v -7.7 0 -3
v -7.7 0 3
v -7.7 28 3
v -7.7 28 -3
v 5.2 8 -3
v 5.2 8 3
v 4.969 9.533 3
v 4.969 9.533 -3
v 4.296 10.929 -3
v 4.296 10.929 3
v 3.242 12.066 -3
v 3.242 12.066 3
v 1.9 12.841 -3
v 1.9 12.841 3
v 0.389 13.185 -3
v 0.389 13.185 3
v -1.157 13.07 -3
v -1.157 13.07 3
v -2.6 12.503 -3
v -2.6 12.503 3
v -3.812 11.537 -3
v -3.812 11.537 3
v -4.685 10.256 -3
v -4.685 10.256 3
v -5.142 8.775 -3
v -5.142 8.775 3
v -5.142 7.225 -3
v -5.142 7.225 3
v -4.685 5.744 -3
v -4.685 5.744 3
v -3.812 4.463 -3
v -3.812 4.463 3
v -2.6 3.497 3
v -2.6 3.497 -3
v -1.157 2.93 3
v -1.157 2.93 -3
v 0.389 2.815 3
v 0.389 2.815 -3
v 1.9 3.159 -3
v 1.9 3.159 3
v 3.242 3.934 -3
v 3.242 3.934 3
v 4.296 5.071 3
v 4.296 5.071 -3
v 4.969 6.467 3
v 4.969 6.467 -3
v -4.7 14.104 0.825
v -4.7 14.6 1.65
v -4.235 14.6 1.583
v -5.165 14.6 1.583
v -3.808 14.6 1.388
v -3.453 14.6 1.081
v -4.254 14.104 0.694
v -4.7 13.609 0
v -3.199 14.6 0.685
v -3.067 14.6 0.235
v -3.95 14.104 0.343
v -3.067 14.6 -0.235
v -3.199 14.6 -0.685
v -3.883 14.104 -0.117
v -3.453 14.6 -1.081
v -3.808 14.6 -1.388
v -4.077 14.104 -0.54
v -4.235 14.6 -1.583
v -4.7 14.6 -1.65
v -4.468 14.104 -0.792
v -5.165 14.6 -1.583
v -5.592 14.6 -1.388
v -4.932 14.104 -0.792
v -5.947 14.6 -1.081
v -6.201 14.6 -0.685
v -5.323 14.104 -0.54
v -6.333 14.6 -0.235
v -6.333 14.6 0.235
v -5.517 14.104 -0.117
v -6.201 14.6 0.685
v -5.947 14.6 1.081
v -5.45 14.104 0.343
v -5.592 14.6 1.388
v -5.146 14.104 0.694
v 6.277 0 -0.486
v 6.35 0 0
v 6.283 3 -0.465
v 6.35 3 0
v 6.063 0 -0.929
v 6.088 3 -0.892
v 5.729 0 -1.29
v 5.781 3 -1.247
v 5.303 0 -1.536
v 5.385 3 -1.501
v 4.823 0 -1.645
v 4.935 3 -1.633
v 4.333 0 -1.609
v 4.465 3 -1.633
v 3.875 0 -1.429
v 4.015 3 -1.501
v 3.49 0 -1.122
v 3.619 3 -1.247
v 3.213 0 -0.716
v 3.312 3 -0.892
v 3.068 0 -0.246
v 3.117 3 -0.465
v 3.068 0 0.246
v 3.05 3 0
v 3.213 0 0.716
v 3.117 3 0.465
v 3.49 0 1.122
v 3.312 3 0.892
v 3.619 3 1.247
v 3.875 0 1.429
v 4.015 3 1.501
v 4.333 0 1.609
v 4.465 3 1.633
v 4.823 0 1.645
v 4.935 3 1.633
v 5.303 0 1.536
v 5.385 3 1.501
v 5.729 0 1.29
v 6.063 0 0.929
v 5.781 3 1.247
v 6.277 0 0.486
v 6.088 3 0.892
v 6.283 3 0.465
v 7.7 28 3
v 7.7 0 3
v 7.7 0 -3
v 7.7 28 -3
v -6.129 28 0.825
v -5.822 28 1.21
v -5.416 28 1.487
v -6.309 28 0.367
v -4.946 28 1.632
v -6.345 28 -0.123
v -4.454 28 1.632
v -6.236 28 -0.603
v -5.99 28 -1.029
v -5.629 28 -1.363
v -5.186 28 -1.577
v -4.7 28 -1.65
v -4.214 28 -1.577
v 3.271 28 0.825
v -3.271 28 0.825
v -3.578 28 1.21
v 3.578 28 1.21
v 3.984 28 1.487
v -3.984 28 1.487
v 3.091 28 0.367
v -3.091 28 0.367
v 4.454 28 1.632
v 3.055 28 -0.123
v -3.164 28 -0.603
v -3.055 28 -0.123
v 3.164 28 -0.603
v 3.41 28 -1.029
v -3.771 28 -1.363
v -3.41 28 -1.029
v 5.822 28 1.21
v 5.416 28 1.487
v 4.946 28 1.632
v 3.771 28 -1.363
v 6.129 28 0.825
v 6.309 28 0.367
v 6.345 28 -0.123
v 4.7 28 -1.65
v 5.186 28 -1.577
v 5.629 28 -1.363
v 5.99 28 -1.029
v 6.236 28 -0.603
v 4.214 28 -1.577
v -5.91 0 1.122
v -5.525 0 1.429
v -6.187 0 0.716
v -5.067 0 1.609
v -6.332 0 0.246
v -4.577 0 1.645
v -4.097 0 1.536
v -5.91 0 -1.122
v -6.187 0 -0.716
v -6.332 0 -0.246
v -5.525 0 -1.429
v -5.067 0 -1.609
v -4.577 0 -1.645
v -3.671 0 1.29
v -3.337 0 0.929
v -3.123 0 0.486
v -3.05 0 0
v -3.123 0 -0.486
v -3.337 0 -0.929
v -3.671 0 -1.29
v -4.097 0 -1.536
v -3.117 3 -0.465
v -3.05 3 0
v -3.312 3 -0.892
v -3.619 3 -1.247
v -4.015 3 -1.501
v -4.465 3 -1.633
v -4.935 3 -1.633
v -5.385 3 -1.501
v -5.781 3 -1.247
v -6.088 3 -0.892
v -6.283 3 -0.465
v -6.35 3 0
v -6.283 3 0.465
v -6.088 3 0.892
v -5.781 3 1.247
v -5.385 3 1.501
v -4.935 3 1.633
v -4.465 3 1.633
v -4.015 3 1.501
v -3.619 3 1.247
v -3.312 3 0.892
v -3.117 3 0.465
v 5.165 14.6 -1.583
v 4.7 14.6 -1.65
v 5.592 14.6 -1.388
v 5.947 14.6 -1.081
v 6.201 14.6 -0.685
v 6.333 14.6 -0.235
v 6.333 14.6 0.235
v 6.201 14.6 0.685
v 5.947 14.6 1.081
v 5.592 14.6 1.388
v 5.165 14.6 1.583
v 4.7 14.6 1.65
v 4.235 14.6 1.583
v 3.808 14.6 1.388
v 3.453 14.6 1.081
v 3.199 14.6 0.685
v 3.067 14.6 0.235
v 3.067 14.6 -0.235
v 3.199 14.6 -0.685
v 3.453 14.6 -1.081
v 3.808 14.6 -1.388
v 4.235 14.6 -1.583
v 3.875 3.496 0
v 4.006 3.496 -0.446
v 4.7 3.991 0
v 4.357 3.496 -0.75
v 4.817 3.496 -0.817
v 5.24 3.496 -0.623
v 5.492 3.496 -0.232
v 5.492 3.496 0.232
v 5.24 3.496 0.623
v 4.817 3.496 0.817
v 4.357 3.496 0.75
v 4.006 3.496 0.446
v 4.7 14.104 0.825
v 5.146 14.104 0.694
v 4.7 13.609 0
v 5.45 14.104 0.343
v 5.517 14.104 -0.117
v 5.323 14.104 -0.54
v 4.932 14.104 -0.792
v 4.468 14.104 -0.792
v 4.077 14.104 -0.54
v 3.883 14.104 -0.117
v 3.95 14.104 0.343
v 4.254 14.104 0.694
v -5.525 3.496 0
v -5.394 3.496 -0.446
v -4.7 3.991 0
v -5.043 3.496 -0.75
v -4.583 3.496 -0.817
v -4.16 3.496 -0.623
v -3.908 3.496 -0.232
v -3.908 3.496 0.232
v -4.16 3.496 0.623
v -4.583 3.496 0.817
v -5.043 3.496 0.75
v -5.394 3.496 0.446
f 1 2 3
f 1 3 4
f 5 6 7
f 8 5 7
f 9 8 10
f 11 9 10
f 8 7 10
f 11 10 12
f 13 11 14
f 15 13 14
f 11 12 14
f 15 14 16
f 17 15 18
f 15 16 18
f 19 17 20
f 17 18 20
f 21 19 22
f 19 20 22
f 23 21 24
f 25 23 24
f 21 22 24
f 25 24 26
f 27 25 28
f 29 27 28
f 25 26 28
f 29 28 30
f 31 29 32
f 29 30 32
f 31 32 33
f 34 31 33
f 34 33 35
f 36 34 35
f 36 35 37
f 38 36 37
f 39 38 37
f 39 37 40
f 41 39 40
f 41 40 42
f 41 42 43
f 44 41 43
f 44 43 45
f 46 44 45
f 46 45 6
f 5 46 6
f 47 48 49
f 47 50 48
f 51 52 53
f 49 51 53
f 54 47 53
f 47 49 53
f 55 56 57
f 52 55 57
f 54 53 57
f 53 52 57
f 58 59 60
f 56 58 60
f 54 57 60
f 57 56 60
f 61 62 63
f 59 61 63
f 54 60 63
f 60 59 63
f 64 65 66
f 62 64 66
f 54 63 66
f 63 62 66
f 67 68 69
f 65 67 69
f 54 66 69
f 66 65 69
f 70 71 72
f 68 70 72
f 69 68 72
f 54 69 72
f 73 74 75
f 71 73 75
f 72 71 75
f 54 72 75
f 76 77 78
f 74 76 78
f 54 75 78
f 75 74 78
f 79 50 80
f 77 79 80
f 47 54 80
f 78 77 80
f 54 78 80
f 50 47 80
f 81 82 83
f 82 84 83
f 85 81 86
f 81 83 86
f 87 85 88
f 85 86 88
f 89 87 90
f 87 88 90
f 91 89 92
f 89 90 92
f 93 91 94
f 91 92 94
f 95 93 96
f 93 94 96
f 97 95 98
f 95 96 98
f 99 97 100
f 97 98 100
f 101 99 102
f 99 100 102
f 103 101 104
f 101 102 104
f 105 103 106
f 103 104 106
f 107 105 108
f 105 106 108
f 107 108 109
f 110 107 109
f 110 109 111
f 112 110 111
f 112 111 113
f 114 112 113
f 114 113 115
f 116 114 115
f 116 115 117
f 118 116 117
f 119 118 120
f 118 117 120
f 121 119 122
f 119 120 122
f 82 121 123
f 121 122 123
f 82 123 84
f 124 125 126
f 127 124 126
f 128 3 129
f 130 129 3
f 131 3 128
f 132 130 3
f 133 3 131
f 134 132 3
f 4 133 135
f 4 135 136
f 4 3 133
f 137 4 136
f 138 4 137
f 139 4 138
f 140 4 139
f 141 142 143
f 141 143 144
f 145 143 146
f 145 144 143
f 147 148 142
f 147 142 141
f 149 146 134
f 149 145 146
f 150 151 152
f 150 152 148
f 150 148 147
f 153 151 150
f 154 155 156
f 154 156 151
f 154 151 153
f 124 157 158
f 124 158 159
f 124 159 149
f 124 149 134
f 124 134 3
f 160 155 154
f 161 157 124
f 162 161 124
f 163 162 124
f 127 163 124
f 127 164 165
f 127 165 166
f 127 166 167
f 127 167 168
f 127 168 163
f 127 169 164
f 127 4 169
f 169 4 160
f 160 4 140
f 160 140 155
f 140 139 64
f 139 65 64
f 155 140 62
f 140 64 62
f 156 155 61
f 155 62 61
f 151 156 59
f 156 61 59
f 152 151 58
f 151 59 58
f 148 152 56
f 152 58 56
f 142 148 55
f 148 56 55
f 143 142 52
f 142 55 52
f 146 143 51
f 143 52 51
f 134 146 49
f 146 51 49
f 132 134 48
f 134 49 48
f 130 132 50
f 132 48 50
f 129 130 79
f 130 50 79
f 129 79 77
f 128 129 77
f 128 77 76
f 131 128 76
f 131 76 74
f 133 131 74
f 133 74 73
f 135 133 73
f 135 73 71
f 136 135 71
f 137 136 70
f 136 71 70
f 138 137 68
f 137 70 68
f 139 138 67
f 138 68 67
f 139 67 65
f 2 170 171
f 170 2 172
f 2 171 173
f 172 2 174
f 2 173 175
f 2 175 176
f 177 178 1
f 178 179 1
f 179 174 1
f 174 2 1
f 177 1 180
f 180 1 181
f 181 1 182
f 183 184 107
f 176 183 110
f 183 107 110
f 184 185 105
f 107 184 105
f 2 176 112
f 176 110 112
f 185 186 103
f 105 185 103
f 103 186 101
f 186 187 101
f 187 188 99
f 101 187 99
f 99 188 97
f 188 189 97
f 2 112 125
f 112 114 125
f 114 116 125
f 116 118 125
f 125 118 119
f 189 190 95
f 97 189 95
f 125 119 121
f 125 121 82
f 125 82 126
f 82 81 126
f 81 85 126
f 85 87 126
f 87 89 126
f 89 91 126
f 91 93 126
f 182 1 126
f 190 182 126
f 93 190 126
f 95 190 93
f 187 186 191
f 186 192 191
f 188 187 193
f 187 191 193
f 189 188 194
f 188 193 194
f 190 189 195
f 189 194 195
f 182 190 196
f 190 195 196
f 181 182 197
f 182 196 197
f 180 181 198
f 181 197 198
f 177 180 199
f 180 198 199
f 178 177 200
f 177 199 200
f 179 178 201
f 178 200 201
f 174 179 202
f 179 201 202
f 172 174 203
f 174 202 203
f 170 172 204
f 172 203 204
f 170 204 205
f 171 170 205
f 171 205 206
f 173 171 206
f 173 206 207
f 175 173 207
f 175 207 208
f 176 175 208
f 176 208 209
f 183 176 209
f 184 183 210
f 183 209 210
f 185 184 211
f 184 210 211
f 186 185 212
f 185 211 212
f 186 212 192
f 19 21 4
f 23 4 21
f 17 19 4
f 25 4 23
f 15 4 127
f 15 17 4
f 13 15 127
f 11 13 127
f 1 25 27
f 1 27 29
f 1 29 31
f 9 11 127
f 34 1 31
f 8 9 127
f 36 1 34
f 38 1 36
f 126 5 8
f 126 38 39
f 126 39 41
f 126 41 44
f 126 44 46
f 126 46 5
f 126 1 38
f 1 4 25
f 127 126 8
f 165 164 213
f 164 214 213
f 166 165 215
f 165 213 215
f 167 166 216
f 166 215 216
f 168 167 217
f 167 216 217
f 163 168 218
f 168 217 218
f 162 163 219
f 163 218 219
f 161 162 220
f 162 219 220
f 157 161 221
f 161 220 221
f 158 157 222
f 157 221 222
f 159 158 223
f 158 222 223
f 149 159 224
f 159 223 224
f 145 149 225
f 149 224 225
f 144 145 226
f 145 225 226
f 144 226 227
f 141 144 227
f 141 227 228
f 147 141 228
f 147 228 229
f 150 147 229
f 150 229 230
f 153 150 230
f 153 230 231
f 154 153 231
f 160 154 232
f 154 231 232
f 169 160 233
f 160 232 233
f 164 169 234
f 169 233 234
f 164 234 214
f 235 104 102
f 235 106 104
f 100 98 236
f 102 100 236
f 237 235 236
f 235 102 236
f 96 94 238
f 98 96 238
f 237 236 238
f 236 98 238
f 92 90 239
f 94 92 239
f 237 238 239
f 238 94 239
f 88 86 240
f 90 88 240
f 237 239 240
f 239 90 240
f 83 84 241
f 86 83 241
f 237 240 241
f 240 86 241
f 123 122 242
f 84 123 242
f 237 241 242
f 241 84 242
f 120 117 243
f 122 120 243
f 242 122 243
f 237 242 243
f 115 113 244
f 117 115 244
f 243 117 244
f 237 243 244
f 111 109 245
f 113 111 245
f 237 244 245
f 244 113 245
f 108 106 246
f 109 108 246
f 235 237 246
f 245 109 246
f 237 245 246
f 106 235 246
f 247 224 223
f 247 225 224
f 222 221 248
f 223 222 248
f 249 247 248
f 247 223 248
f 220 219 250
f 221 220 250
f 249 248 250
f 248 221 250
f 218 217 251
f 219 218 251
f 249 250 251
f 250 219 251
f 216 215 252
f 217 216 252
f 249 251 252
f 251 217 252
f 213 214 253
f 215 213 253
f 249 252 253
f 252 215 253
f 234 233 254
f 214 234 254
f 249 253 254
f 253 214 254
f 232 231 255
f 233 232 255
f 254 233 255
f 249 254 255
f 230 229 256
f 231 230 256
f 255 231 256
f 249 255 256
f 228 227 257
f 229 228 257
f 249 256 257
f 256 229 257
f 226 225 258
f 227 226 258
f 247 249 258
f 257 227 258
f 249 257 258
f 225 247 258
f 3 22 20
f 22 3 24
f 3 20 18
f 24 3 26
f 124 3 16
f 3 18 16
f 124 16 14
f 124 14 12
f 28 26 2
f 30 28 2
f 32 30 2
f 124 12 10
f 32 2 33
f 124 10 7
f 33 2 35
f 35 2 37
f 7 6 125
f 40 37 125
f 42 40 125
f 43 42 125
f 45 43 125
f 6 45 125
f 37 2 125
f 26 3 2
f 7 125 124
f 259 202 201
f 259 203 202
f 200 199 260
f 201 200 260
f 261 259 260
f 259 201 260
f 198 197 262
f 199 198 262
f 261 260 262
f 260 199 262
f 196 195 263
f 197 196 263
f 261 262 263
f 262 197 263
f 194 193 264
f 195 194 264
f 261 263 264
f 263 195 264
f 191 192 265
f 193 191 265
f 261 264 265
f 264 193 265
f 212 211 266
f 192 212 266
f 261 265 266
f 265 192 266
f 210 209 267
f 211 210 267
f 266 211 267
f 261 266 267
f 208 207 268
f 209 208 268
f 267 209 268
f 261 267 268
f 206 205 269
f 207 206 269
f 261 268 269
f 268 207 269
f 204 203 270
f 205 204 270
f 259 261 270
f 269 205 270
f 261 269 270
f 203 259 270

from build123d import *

# Parameters (mm, degrees)
SKETCH1_W                                     = 15.4
SKETCH1_H                                     = 6
BOSS_EXTRUDE1_DEPTH                           = 28
TAP_DRILL_FOR_M4X0_7_TAP1_D                   = 3.3
TAP_DRILL_FOR_M4X0_7_TAP1_DEPTH               = 13.4
TAP_DRILL_FOR_M4X0_7_TAP1_TIP                 = 0.991420021
CUT_EXTRUDE_PRESS_FIT_HOLE_FOR_SOLENOID_REACH = 31.653
SKETCH4_R                                     = 5.2
TAP_DRILL_FOR_M4X0_7_TAP2_D                   = 3.3
TAP_DRILL_FOR_M4X0_7_TAP2_DEPTH               = 3
TAP_DRILL_FOR_M4X0_7_TAP2_TIP                 = 0.991420021


with BuildPart() as part:
    # Sketch1 → Boss-Extrude1 (new body)
    with BuildSketch(Plane(origin=(0, 0, 0), x_dir=(1, 0, 0), z_dir=(0, 1, 0))):
        Rectangle(SKETCH1_W, SKETCH1_H)
    extrude(amount=BOSS_EXTRUDE1_DEPTH)

    # Tap Drill for M4x0.7 Tap1
    with Locations(Plane(origin=(-4.7, 28, 0), x_dir=(0, 0, 1), z_dir=(0, 1, 0))):
        with Locations((0, 0), (0, 9.4)):
            Hole(TAP_DRILL_FOR_M4X0_7_TAP1_D / 2, depth=TAP_DRILL_FOR_M4X0_7_TAP1_DEPTH)
            with Locations((0, 0, -(TAP_DRILL_FOR_M4X0_7_TAP1_DEPTH + TAP_DRILL_FOR_M4X0_7_TAP1_TIP / 2))):  # 118° drill point
                Cone(0, TAP_DRILL_FOR_M4X0_7_TAP1_D / 2, TAP_DRILL_FOR_M4X0_7_TAP1_TIP, mode=Mode.SUBTRACT)

    # Sketch4 → Cut-Extrude Press Fit hole for solenoid tube (cut, up to next)
    with BuildSketch(Plane.XY.offset(3), mode=Mode.PRIVATE) as cut_extrude_press_fit_hole_for_solenoid_sk1:
        with Locations((0, 8)):
            Circle(SKETCH4_R)
    cut_extrude_press_fit_hole_for_solenoid_tool1 = extrude(cut_extrude_press_fit_hole_for_solenoid_sk1.sketch, amount=-CUT_EXTRUDE_PRESS_FIT_HOLE_FOR_SOLENOID_REACH, mode=Mode.PRIVATE) & part.part
    add(cut_extrude_press_fit_hole_for_solenoid_tool1.solids().sort_by_distance((0, 8, 3))[0], mode=Mode.SUBTRACT)

    # Tap Drill for M4x0.7 Tap2
    with Locations(Plane(origin=(0, 0, 0), x_dir=(-1, 0, 0), z_dir=(0, -1, 0))):
        with Locations((-4.7, 0), (4.7, 0)):
            Hole(TAP_DRILL_FOR_M4X0_7_TAP2_D / 2, depth=TAP_DRILL_FOR_M4X0_7_TAP2_DEPTH)
            with Locations((0, 0, -(TAP_DRILL_FOR_M4X0_7_TAP2_DEPTH + TAP_DRILL_FOR_M4X0_7_TAP2_TIP / 2))):  # 118° drill point
                Cone(0, TAP_DRILL_FOR_M4X0_7_TAP2_D / 2, TAP_DRILL_FOR_M4X0_7_TAP2_TIP, mode=Mode.SUBTRACT)


solid = part.part
